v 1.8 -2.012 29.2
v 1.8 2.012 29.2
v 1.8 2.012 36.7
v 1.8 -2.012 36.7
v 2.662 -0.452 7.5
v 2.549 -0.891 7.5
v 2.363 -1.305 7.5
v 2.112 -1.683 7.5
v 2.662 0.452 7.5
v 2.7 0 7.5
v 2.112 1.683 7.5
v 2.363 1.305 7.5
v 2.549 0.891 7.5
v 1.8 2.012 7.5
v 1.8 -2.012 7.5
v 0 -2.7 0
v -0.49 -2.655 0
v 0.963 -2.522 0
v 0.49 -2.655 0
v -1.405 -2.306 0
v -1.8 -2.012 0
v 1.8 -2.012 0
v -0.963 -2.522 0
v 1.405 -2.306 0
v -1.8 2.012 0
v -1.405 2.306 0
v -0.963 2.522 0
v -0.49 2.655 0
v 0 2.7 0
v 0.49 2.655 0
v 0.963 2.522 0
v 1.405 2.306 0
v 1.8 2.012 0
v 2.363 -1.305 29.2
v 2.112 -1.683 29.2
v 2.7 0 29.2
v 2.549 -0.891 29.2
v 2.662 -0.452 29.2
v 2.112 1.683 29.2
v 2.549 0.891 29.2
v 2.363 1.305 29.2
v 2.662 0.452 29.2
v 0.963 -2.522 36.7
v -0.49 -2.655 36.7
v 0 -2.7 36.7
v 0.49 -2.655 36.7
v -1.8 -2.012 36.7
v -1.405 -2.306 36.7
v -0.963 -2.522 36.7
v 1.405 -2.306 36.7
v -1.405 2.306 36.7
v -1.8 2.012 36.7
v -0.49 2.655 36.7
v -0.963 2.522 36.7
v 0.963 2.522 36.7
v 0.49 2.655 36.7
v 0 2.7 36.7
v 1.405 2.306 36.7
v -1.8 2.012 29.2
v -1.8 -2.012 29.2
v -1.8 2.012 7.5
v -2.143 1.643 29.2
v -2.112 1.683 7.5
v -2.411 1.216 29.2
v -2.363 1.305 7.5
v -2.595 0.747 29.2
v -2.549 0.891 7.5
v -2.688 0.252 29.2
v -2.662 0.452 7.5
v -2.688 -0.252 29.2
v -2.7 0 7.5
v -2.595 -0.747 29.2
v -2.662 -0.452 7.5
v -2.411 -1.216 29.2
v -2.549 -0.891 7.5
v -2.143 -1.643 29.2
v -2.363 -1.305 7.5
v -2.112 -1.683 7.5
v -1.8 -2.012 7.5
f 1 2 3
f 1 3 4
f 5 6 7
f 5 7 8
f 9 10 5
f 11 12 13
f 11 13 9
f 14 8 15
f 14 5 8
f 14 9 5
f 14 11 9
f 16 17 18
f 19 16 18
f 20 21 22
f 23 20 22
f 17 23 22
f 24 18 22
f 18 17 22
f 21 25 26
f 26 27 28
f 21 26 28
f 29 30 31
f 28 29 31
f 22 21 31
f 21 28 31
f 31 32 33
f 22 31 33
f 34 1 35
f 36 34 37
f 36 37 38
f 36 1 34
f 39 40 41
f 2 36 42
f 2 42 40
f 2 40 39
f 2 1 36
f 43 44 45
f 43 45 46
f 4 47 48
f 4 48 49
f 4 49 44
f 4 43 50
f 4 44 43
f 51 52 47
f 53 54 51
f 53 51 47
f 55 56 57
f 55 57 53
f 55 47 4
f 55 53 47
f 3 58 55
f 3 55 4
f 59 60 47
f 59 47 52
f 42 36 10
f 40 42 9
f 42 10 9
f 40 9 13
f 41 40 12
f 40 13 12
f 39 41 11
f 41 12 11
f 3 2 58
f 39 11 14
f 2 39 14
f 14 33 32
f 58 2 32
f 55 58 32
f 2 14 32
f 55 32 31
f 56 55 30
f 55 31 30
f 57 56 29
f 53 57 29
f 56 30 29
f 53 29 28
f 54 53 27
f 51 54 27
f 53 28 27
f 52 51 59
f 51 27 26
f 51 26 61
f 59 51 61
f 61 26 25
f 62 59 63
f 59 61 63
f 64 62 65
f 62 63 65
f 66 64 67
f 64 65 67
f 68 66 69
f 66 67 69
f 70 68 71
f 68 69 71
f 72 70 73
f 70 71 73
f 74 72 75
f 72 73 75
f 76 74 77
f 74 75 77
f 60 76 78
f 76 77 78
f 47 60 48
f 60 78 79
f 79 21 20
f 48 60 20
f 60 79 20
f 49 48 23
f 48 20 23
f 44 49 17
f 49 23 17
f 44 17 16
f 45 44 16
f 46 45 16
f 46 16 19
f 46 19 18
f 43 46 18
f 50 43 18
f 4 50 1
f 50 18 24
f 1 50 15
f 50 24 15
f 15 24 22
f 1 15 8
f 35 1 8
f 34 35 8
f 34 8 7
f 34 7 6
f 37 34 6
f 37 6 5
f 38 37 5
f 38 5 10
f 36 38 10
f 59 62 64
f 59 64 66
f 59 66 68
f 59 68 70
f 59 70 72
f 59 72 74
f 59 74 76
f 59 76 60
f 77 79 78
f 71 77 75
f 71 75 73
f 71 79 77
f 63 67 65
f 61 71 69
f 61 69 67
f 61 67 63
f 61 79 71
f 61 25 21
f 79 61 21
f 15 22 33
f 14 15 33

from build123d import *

# Parameters (mm, degrees)
CROQUIS1_R              = 2.7
SALIENTE_EXTRUIR1_DEPTH = 36.7
CORTAR_EXTRUIR1_DEPTH   = 7.5
CORTAR_EXTRUIR2_START   = -7.5
CORTAR_EXTRUIR2_DEPTH   = 7.5


with BuildPart() as part:
    # Croquis1 → Saliente-Extruir1 (new body)
    with BuildSketch(Plane.XY):
        Circle(CROQUIS1_R)
    extrude(amount=SALIENTE_EXTRUIR1_DEPTH)

    # Croquis2 → Cortar-Extruir1 (cut)
    with BuildSketch(Plane(origin=(0, 0, 0), x_dir=(-1, 0, 0), z_dir=(0, 0, -1))):
        with BuildLine():
            ThreePointArc((-1.8, 2.01246118), (-2.7, 0), (-1.8, -2.01246118))
            Line((-1.8, -2.01246118), (-1.8, 2.01246118))
        make_face()
        with BuildLine():
            Line((1.8, 2.01246118), (1.8, -2.01246118))
            ThreePointArc((1.8, -2.01246118), (2.464751509, -1.102270384), (2.7, 0))
            ThreePointArc((2.7, 0), (2.464751509, 1.102270384), (1.8, 2.01246118))
        make_face()
    extrude(amount=-CORTAR_EXTRUIR1_DEPTH, mode=Mode.SUBTRACT)

    # Croquis3 → Cortar-Extruir2 (cut)
    with BuildSketch(Plane.XY.offset(36.7).offset(CORTAR_EXTRUIR2_START)):
        with BuildLine():
            Line((1.8, 2.01246118), (1.8, -2.01246118))
            ThreePointArc((1.8, -2.01246118), (2.464751509, -1.102270384), (2.7, 0))
            ThreePointArc((2.7, 0), (2.464751509, 1.102270384), (1.8, 2.01246118))
        make_face()
        with BuildLine():
            ThreePointArc((-1.8, 2.01246118), (-2.7, 0), (-1.8, -2.01246118))
            Line((-1.8, -2.01246118), (-1.8, 2.01246118))
        make_face()
    extrude(amount=CORTAR_EXTRUIR2_DEPTH, mode=Mode.SUBTRACT)


solid = part.part
